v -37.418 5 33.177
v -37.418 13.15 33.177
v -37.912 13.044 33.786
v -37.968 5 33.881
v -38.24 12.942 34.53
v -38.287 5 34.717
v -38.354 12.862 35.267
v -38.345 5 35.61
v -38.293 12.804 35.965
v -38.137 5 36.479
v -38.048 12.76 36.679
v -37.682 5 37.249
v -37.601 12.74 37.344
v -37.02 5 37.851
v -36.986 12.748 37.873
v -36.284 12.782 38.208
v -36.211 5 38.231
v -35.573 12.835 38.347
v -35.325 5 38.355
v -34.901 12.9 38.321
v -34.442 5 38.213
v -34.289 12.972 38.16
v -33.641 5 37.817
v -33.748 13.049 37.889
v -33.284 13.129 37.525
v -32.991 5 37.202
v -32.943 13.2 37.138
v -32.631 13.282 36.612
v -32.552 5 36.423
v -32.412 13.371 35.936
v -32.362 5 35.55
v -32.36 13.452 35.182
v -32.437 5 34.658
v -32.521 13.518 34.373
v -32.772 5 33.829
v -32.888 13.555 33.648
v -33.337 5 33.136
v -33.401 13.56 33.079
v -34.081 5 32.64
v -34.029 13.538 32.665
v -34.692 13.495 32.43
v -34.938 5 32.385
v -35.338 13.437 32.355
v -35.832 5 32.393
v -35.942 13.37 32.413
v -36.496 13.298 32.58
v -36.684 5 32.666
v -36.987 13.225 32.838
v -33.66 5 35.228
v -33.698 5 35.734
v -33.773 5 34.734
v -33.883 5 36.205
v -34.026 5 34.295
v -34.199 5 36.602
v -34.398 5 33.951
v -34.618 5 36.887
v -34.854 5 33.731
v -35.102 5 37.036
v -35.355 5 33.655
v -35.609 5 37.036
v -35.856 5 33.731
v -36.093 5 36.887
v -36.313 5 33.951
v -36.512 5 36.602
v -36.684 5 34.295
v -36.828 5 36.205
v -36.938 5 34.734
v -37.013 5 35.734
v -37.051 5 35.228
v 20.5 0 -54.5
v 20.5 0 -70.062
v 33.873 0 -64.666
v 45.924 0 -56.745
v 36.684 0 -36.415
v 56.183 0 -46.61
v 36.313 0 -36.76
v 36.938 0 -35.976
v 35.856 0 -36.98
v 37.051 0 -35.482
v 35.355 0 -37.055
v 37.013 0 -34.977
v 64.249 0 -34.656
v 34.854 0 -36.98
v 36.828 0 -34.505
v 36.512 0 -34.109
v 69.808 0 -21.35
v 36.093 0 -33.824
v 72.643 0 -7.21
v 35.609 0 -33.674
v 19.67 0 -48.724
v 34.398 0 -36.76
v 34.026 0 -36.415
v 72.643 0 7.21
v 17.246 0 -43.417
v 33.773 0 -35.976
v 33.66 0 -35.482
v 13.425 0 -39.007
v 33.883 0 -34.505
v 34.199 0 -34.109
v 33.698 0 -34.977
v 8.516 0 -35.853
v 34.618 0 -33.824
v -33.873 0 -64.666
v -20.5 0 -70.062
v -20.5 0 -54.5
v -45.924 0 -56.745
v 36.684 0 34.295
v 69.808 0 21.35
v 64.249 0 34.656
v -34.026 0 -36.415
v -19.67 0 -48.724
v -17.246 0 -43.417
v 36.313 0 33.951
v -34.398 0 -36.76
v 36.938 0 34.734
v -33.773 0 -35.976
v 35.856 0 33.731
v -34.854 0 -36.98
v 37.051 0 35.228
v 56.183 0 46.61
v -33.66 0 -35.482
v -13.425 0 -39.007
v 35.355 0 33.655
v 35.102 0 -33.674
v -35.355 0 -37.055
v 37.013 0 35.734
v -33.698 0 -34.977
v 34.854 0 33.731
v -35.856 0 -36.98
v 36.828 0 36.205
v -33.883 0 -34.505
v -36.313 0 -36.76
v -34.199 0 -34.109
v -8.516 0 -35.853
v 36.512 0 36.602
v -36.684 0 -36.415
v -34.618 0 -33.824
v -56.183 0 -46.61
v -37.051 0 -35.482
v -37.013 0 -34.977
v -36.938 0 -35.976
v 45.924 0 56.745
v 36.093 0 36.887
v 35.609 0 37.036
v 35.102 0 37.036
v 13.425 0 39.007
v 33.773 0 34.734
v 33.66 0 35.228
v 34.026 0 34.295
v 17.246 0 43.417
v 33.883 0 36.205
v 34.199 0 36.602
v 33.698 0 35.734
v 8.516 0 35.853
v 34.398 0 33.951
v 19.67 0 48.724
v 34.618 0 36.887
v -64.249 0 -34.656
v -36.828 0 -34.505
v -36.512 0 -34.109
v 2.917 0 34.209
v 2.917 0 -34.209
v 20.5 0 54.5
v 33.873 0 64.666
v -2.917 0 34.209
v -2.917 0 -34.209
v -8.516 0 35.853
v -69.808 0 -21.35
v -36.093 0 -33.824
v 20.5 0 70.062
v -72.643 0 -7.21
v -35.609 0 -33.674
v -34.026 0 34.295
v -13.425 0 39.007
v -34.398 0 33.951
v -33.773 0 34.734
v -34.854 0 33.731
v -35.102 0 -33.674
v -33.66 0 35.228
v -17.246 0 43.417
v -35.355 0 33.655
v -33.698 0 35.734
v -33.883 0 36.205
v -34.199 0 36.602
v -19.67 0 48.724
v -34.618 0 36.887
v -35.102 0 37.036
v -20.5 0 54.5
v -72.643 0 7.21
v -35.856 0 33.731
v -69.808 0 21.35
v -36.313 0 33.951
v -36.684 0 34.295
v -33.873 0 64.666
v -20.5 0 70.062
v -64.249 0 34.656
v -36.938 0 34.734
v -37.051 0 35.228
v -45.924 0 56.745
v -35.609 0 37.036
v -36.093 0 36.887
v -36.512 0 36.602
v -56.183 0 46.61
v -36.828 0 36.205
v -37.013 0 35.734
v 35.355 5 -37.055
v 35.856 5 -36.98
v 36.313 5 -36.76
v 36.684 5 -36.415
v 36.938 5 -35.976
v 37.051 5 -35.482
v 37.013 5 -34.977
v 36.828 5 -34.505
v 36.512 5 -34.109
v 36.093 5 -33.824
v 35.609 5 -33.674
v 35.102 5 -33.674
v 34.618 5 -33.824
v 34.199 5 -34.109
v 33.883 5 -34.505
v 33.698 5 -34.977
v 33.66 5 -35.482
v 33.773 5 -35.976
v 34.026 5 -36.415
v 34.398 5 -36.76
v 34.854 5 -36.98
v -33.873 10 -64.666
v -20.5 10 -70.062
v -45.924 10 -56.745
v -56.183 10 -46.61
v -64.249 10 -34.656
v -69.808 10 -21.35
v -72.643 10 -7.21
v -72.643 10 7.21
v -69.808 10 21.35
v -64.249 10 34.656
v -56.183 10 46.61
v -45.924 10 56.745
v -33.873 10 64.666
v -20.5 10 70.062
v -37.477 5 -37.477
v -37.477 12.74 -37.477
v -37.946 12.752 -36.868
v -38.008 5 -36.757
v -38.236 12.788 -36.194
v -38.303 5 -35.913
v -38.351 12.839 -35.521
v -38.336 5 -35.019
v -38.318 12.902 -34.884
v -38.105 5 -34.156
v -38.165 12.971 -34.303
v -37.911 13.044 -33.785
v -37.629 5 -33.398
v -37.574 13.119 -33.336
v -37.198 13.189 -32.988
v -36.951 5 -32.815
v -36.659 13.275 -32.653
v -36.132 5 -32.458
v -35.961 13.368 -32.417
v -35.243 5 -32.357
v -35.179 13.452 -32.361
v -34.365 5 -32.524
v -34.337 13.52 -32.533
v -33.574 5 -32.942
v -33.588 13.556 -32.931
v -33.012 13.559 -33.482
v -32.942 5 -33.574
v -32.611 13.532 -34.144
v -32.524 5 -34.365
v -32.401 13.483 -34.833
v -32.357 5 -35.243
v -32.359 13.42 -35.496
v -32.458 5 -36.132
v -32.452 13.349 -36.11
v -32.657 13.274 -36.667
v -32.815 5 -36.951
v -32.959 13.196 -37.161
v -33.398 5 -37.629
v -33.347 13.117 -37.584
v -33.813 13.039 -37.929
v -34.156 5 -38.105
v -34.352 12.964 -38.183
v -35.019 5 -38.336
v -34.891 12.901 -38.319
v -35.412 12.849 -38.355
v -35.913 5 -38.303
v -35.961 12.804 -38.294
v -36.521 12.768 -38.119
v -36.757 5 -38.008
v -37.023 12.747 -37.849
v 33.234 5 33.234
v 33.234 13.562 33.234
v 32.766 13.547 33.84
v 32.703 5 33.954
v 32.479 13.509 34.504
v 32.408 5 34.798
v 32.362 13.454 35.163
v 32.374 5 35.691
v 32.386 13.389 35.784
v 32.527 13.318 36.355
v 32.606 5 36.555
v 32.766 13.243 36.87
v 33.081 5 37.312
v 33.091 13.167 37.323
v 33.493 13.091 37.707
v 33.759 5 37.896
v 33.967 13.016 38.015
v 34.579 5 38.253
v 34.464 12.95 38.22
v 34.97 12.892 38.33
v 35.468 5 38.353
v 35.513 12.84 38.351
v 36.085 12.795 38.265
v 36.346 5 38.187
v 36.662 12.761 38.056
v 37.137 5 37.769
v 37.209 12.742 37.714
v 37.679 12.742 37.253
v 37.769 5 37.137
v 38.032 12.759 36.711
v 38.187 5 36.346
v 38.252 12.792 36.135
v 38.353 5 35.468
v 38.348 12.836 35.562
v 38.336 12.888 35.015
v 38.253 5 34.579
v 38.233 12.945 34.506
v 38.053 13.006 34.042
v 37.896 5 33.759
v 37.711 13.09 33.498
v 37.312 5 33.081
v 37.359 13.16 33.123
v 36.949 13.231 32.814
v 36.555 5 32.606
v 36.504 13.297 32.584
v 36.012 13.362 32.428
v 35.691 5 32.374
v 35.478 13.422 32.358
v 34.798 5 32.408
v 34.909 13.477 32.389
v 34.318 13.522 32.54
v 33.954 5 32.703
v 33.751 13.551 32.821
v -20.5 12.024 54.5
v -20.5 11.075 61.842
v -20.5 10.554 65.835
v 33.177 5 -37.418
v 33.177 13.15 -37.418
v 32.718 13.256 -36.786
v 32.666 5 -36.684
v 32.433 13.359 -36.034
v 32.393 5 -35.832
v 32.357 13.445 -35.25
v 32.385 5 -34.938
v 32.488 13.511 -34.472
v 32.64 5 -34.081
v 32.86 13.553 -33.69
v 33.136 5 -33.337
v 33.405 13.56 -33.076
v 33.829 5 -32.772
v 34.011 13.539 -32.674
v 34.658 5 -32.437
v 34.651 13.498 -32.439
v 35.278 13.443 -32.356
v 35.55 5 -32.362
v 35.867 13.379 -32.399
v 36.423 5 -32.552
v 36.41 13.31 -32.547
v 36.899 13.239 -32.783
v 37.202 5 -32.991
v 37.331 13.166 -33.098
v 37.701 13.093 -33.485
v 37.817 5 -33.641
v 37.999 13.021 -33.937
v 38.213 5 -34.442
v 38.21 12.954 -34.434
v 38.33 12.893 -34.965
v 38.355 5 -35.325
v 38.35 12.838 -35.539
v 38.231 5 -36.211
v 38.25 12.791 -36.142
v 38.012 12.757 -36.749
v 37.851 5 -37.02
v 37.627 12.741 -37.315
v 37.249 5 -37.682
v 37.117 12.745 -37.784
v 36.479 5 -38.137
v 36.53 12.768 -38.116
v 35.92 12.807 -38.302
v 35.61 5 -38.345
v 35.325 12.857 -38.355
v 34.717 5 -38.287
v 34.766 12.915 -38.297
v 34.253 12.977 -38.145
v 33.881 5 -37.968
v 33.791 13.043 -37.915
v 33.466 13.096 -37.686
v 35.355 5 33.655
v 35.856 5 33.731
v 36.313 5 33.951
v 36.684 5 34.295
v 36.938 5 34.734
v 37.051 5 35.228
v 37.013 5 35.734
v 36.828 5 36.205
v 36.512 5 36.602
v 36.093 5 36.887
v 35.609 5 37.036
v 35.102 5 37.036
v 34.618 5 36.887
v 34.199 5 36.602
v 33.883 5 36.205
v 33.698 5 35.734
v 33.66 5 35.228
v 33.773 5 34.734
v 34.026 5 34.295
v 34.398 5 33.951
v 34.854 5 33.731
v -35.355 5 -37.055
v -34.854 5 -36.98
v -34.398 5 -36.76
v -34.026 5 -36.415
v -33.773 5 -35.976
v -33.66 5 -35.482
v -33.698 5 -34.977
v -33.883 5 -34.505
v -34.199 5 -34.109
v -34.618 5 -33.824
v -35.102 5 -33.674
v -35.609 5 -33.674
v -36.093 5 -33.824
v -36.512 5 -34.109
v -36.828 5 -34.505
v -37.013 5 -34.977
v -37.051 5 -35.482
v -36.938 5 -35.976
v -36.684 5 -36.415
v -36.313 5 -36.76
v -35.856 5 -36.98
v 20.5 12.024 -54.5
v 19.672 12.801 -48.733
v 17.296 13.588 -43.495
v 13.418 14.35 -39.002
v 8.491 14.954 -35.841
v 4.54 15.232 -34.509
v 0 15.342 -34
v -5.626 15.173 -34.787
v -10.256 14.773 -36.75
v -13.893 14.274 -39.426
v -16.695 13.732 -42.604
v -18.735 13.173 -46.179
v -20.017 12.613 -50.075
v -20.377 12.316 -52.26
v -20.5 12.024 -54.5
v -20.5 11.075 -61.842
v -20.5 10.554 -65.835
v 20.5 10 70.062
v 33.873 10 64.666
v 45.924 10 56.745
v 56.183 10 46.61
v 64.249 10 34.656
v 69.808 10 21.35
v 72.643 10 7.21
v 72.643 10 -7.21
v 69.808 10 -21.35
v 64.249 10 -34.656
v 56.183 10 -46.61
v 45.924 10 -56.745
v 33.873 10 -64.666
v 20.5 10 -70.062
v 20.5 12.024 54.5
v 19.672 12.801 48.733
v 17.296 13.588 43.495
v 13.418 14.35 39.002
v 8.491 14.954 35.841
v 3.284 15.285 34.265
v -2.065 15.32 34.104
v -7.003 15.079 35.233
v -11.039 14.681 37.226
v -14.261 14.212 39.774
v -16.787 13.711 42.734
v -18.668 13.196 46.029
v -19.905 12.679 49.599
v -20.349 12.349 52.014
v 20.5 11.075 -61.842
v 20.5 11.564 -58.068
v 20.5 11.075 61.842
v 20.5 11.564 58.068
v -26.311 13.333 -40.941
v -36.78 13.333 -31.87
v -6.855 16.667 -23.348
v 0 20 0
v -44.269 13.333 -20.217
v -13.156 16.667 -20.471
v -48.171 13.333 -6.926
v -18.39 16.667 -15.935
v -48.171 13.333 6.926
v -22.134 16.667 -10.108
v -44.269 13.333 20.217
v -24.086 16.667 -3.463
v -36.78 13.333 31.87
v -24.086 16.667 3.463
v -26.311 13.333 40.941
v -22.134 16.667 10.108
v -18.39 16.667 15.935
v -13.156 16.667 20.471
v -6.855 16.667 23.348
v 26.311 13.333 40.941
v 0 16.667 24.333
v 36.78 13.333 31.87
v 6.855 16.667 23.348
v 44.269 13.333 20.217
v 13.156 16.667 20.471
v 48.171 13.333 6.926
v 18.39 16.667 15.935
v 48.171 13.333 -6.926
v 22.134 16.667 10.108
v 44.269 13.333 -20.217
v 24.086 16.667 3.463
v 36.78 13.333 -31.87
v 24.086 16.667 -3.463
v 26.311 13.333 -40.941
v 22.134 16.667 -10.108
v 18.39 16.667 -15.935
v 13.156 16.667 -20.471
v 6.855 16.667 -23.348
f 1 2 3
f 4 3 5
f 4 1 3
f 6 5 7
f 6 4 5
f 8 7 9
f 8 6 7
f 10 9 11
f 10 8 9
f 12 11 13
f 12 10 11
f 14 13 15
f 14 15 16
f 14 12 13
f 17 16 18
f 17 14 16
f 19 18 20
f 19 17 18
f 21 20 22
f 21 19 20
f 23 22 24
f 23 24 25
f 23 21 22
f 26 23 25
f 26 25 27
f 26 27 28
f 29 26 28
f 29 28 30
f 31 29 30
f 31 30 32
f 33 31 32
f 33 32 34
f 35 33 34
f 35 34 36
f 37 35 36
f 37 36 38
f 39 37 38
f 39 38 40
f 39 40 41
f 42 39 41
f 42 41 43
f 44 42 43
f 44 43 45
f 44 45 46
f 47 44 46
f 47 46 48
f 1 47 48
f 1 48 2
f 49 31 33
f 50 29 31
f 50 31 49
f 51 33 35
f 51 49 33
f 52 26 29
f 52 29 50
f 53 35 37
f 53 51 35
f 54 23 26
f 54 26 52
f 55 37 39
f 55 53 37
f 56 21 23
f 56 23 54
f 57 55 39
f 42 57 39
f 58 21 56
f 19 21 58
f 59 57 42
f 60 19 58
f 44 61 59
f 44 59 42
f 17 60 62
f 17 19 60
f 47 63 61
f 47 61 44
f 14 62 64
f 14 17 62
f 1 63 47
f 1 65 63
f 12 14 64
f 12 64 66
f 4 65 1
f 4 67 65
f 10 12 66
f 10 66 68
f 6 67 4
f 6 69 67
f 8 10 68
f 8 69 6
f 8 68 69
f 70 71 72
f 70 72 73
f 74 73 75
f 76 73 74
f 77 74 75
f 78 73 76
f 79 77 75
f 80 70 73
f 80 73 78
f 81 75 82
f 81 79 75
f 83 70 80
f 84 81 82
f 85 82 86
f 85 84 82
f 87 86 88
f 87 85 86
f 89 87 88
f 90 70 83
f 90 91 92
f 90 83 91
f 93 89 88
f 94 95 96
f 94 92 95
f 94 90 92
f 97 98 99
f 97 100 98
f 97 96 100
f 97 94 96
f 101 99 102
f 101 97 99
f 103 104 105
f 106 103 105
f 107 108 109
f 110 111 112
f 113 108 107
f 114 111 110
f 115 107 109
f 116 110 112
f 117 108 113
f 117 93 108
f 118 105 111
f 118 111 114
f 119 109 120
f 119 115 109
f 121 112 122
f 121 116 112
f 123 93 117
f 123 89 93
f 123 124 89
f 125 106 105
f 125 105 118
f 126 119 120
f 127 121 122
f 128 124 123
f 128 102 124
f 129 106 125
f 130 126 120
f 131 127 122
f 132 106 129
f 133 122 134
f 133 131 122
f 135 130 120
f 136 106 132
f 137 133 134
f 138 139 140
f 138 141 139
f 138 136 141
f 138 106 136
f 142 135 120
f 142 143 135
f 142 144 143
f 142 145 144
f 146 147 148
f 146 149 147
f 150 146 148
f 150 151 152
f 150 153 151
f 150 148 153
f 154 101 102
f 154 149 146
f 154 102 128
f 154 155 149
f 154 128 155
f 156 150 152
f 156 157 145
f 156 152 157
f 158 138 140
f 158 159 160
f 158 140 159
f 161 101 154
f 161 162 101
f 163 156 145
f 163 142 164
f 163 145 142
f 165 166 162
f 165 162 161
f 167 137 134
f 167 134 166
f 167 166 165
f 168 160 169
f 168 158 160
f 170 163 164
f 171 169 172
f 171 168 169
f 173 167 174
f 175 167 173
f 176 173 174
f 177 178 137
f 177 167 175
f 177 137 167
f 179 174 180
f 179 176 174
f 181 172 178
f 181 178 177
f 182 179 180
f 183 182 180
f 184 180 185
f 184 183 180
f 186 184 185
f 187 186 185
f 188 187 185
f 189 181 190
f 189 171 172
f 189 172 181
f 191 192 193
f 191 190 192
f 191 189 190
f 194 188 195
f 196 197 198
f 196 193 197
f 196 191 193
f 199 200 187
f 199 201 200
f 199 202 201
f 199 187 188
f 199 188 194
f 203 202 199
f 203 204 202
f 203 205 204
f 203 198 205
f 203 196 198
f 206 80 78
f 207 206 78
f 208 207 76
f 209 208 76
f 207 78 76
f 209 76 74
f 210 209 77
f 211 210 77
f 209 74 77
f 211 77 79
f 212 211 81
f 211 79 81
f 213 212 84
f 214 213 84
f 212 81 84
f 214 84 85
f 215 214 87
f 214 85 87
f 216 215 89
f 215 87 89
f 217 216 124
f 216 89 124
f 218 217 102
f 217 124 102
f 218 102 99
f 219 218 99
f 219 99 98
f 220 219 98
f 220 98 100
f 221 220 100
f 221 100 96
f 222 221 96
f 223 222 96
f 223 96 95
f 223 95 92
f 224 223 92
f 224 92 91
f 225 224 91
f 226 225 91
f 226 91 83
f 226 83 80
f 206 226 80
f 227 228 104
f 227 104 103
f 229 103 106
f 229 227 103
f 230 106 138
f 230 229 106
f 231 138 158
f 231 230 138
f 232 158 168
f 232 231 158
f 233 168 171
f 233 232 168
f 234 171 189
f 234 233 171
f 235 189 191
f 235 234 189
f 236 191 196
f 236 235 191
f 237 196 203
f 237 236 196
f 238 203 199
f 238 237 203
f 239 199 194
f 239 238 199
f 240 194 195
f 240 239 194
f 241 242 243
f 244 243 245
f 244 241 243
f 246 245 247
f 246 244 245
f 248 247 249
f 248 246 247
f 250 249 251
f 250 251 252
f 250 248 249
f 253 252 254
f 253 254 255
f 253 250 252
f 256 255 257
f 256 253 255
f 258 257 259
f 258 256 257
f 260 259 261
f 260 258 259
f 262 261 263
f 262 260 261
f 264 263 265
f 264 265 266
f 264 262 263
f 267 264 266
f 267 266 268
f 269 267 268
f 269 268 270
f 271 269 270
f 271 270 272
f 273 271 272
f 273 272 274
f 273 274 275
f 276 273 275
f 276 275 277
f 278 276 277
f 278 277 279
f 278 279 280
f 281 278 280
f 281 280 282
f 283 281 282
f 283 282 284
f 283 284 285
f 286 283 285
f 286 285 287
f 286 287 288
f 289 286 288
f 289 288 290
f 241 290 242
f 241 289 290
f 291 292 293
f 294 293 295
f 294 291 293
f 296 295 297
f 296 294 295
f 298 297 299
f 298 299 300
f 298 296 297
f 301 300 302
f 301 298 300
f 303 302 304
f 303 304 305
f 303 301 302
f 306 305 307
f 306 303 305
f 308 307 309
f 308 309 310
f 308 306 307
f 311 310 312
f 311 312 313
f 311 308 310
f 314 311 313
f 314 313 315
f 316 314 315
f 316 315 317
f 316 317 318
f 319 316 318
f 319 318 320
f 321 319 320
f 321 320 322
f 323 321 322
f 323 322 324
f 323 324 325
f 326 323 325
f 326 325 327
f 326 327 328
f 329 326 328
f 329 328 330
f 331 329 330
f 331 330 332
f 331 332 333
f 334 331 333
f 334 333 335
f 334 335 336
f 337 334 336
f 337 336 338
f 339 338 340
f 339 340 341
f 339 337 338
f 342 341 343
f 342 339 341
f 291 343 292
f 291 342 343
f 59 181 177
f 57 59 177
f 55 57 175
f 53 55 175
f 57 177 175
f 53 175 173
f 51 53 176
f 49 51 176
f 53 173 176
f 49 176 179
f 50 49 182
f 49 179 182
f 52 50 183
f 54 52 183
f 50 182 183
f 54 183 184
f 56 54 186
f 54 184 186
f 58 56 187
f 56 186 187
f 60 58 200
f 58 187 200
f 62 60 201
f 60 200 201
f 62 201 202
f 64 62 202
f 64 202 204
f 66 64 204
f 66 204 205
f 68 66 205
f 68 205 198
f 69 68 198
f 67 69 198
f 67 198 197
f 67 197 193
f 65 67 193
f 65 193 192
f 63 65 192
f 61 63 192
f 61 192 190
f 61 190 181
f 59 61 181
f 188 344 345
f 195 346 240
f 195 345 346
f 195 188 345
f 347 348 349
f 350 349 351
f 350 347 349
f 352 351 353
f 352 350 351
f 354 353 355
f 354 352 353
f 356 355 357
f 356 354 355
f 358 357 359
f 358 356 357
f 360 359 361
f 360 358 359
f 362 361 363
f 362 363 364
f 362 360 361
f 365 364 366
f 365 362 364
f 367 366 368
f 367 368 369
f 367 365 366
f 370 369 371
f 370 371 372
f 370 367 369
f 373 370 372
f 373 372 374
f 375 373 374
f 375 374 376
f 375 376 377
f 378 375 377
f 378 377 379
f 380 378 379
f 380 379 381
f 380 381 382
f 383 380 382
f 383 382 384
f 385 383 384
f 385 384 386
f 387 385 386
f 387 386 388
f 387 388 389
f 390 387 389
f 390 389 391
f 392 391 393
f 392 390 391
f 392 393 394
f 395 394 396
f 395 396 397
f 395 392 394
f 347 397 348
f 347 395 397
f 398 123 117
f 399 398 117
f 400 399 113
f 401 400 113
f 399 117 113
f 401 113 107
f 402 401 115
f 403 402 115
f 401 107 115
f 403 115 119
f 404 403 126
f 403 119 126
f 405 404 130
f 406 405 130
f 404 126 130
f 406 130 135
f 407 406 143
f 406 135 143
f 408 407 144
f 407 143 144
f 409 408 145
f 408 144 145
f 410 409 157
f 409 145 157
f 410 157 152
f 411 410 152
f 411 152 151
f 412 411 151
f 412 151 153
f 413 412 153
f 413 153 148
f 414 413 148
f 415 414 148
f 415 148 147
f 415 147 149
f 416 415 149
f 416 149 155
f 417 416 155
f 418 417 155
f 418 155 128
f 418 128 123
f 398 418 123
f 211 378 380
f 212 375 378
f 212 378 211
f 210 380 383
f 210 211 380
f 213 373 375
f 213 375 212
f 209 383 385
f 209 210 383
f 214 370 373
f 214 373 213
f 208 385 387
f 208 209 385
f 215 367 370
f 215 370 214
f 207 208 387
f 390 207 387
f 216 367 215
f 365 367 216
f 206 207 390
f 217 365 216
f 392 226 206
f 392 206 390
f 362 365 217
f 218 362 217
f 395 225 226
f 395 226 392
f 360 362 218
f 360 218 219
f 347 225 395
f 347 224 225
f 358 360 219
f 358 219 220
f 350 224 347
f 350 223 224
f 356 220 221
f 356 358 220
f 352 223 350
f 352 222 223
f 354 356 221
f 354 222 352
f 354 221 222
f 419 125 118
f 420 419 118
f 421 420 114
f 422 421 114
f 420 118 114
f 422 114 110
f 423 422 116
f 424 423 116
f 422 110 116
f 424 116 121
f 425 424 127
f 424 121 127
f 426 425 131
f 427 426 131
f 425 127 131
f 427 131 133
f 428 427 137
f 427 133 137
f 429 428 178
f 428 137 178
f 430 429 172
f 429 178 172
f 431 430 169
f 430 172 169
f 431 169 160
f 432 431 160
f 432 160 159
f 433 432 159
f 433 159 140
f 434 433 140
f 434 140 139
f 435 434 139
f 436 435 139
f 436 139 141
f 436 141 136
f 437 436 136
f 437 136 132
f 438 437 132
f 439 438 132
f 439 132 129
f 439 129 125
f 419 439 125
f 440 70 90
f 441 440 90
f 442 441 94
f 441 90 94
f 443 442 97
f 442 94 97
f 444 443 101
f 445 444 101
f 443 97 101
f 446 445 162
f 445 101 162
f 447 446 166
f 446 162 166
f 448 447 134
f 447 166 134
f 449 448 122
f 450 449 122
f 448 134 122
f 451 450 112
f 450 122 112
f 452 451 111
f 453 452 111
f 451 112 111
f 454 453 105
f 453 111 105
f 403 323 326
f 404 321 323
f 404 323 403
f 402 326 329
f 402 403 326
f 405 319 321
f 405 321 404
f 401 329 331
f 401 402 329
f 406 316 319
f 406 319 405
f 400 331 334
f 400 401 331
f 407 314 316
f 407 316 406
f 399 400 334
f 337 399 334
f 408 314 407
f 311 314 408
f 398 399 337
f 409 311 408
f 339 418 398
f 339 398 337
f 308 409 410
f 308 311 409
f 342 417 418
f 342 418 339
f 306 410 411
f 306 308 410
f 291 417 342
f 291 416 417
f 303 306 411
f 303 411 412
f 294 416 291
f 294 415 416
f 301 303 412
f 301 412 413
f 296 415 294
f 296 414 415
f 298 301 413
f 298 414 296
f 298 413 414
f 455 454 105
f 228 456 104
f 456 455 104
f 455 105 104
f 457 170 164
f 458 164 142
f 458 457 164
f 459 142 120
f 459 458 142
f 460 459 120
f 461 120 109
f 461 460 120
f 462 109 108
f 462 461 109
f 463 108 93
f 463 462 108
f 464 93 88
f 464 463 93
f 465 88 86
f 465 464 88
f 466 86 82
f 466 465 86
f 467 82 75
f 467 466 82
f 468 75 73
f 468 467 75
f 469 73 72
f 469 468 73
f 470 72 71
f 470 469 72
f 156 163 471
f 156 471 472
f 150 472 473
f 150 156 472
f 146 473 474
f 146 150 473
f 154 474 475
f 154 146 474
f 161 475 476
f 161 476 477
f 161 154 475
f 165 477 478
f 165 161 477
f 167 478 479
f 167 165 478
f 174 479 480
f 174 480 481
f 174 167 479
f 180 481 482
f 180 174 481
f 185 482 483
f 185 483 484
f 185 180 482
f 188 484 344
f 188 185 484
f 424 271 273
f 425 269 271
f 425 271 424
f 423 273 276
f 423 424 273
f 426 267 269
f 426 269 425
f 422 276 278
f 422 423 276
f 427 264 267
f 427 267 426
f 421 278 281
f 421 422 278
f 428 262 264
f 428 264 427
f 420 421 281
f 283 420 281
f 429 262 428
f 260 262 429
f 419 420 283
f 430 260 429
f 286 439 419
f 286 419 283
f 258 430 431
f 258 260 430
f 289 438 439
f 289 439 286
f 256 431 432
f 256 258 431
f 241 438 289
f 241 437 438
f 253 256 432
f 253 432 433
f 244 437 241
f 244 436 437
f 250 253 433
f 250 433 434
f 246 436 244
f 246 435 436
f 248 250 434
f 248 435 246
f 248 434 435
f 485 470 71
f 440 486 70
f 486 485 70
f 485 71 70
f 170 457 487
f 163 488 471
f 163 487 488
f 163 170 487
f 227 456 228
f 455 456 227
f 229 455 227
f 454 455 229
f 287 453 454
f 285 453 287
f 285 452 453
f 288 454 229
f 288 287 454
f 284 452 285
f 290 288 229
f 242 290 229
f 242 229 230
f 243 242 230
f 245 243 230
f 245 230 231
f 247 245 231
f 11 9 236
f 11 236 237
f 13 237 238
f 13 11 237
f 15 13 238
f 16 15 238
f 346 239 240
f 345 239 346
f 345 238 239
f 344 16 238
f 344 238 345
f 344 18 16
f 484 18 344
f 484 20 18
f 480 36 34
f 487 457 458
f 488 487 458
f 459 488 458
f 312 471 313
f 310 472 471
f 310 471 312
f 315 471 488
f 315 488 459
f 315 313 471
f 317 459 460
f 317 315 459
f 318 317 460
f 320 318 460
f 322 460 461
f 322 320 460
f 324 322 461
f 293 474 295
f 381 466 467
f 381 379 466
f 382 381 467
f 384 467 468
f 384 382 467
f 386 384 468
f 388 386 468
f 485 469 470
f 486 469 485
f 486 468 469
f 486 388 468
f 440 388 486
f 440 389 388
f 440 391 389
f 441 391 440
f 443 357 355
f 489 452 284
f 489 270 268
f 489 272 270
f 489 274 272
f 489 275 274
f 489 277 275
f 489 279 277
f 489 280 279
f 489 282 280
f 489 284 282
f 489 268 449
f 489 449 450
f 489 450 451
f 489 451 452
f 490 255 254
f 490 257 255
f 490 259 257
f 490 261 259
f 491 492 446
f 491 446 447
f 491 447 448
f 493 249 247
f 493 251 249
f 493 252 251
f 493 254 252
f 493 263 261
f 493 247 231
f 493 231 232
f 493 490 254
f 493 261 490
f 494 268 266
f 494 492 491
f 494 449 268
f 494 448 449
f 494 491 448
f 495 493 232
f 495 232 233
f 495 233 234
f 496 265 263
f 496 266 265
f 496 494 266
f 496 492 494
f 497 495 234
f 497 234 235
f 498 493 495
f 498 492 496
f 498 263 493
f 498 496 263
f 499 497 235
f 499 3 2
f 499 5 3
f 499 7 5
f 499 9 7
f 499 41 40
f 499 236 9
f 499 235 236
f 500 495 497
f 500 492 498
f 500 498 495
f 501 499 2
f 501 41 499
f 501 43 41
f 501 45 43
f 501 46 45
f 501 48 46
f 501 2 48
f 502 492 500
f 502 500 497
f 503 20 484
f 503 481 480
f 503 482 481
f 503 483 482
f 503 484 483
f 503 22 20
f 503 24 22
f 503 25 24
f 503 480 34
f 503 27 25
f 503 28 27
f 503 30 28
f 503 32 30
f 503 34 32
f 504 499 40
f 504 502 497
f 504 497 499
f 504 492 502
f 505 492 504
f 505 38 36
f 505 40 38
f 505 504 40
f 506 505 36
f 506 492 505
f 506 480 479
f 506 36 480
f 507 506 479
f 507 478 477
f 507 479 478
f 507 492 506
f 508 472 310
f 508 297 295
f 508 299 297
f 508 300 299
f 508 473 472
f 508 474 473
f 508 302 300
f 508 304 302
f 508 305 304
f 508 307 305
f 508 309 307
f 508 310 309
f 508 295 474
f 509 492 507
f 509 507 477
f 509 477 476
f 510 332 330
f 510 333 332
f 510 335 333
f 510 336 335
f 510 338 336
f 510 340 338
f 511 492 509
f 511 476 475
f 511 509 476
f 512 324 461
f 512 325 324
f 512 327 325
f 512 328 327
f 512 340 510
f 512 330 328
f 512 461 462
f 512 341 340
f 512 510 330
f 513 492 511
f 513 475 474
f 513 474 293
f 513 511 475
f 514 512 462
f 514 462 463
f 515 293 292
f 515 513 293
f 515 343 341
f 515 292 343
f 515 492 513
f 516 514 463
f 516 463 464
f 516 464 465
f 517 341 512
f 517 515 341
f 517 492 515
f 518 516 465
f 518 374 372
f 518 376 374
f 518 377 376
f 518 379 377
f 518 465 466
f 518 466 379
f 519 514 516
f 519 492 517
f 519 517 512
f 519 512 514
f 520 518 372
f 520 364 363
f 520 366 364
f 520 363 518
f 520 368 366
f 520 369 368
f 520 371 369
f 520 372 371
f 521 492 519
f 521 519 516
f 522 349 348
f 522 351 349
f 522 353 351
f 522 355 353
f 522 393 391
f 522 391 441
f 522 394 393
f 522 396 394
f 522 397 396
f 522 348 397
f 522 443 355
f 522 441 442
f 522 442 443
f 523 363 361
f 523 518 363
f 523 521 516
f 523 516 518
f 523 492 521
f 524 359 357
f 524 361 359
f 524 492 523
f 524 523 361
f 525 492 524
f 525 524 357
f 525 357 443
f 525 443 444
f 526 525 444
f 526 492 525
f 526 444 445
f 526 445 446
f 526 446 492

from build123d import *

# Parameters (mm, degrees)
SKETCH4_R          = 1.7
CUT_EXTRUDE1_DEPTH = 106.157025443
CUT_EXTRUDE2_DEPTH = 106.157025601
SKETCH9_R          = 3
CUT_EXTRUDE3_DEPTH = 103.287584934


with BuildPart() as part:
    # Sketch2 → Revolve1 (revolve)
    with BuildSketch(Plane(origin=(0, 0, 0), x_dir=(0, 0, -1), z_dir=(1, 0, 0))):
        Polygon((0, 0), (73, 0), (73, 10), (0, 20), align=None)
    revolve(axis=Axis((0, 10, 0), (0, 1, 0)))

    # Sketch4 → Cut-Extrude1 (cut, through all)
    with BuildSketch(Plane.XZ):
        with Locations(Location((-35.355339059, 35.355339059, 0), (0, 0, 270))):
            Circle(SKETCH4_R)
        with Locations(Location((35.355339059, 35.355339059, 0), (0, 0, 270))):
            Circle(SKETCH4_R)
        with Locations(Location((35.355339059, -35.355339059, 0), (0, 0, 270))):
            Circle(SKETCH4_R)
        with Locations(Location((-35.355339059, -35.355339059, 0), (0, 0, 270))):
            Circle(SKETCH4_R)
    extrude(amount=-CUT_EXTRUDE1_DEPTH, mode=Mode.SUBTRACT)

    # Sketch5 → Cut-Extrude2 (cut, through all)
    with BuildSketch(Plane.XZ):
        with BuildLine():
            Line((-20.5, 54.5), (-20.5, 75))
            Line((-20.5, 75), (0, 75))
            Line((0, 75), (20.5, 75))
            Line((20.5, 75), (20.5, 54.5))
            ThreePointArc((20.5, 54.5), (0, 34), (-20.5, 54.5))
        make_face()
    cut_extrude2 = extrude(amount=-CUT_EXTRUDE2_DEPTH, mode=Mode.SUBTRACT)

    # Mirror1: Cut-Extrude2 across plane
    add(cut_extrude2.mirror(Plane.XY), mode=Mode.SUBTRACT)

    # Sketch9 → Cut-Extrude3 (cut, through all)
    with BuildSketch(Plane(origin=(0, 5, 0), x_dir=(1, 0, 0), z_dir=(0, 1, 0))):
        with Locations(Location((-35.355339059, -35.355339059, 0), (0, 0, 133.431744149))):
            Circle(SKETCH9_R)
        with Locations(Location((-35.355339059, 35.355339059, 0), (0, 0, 135))):
            Circle(SKETCH9_R)
        with Locations(Location((35.355339059, 35.355339059, 0), (0, 0, 136.568255851))):
            Circle(SKETCH9_R)
        with Locations(Location((35.355339059, -35.355339059, 0), (0, 0, 135))):
            Circle(SKETCH9_R)
    extrude(amount=CUT_EXTRUDE3_DEPTH, mode=Mode.SUBTRACT)


solid = part.part
